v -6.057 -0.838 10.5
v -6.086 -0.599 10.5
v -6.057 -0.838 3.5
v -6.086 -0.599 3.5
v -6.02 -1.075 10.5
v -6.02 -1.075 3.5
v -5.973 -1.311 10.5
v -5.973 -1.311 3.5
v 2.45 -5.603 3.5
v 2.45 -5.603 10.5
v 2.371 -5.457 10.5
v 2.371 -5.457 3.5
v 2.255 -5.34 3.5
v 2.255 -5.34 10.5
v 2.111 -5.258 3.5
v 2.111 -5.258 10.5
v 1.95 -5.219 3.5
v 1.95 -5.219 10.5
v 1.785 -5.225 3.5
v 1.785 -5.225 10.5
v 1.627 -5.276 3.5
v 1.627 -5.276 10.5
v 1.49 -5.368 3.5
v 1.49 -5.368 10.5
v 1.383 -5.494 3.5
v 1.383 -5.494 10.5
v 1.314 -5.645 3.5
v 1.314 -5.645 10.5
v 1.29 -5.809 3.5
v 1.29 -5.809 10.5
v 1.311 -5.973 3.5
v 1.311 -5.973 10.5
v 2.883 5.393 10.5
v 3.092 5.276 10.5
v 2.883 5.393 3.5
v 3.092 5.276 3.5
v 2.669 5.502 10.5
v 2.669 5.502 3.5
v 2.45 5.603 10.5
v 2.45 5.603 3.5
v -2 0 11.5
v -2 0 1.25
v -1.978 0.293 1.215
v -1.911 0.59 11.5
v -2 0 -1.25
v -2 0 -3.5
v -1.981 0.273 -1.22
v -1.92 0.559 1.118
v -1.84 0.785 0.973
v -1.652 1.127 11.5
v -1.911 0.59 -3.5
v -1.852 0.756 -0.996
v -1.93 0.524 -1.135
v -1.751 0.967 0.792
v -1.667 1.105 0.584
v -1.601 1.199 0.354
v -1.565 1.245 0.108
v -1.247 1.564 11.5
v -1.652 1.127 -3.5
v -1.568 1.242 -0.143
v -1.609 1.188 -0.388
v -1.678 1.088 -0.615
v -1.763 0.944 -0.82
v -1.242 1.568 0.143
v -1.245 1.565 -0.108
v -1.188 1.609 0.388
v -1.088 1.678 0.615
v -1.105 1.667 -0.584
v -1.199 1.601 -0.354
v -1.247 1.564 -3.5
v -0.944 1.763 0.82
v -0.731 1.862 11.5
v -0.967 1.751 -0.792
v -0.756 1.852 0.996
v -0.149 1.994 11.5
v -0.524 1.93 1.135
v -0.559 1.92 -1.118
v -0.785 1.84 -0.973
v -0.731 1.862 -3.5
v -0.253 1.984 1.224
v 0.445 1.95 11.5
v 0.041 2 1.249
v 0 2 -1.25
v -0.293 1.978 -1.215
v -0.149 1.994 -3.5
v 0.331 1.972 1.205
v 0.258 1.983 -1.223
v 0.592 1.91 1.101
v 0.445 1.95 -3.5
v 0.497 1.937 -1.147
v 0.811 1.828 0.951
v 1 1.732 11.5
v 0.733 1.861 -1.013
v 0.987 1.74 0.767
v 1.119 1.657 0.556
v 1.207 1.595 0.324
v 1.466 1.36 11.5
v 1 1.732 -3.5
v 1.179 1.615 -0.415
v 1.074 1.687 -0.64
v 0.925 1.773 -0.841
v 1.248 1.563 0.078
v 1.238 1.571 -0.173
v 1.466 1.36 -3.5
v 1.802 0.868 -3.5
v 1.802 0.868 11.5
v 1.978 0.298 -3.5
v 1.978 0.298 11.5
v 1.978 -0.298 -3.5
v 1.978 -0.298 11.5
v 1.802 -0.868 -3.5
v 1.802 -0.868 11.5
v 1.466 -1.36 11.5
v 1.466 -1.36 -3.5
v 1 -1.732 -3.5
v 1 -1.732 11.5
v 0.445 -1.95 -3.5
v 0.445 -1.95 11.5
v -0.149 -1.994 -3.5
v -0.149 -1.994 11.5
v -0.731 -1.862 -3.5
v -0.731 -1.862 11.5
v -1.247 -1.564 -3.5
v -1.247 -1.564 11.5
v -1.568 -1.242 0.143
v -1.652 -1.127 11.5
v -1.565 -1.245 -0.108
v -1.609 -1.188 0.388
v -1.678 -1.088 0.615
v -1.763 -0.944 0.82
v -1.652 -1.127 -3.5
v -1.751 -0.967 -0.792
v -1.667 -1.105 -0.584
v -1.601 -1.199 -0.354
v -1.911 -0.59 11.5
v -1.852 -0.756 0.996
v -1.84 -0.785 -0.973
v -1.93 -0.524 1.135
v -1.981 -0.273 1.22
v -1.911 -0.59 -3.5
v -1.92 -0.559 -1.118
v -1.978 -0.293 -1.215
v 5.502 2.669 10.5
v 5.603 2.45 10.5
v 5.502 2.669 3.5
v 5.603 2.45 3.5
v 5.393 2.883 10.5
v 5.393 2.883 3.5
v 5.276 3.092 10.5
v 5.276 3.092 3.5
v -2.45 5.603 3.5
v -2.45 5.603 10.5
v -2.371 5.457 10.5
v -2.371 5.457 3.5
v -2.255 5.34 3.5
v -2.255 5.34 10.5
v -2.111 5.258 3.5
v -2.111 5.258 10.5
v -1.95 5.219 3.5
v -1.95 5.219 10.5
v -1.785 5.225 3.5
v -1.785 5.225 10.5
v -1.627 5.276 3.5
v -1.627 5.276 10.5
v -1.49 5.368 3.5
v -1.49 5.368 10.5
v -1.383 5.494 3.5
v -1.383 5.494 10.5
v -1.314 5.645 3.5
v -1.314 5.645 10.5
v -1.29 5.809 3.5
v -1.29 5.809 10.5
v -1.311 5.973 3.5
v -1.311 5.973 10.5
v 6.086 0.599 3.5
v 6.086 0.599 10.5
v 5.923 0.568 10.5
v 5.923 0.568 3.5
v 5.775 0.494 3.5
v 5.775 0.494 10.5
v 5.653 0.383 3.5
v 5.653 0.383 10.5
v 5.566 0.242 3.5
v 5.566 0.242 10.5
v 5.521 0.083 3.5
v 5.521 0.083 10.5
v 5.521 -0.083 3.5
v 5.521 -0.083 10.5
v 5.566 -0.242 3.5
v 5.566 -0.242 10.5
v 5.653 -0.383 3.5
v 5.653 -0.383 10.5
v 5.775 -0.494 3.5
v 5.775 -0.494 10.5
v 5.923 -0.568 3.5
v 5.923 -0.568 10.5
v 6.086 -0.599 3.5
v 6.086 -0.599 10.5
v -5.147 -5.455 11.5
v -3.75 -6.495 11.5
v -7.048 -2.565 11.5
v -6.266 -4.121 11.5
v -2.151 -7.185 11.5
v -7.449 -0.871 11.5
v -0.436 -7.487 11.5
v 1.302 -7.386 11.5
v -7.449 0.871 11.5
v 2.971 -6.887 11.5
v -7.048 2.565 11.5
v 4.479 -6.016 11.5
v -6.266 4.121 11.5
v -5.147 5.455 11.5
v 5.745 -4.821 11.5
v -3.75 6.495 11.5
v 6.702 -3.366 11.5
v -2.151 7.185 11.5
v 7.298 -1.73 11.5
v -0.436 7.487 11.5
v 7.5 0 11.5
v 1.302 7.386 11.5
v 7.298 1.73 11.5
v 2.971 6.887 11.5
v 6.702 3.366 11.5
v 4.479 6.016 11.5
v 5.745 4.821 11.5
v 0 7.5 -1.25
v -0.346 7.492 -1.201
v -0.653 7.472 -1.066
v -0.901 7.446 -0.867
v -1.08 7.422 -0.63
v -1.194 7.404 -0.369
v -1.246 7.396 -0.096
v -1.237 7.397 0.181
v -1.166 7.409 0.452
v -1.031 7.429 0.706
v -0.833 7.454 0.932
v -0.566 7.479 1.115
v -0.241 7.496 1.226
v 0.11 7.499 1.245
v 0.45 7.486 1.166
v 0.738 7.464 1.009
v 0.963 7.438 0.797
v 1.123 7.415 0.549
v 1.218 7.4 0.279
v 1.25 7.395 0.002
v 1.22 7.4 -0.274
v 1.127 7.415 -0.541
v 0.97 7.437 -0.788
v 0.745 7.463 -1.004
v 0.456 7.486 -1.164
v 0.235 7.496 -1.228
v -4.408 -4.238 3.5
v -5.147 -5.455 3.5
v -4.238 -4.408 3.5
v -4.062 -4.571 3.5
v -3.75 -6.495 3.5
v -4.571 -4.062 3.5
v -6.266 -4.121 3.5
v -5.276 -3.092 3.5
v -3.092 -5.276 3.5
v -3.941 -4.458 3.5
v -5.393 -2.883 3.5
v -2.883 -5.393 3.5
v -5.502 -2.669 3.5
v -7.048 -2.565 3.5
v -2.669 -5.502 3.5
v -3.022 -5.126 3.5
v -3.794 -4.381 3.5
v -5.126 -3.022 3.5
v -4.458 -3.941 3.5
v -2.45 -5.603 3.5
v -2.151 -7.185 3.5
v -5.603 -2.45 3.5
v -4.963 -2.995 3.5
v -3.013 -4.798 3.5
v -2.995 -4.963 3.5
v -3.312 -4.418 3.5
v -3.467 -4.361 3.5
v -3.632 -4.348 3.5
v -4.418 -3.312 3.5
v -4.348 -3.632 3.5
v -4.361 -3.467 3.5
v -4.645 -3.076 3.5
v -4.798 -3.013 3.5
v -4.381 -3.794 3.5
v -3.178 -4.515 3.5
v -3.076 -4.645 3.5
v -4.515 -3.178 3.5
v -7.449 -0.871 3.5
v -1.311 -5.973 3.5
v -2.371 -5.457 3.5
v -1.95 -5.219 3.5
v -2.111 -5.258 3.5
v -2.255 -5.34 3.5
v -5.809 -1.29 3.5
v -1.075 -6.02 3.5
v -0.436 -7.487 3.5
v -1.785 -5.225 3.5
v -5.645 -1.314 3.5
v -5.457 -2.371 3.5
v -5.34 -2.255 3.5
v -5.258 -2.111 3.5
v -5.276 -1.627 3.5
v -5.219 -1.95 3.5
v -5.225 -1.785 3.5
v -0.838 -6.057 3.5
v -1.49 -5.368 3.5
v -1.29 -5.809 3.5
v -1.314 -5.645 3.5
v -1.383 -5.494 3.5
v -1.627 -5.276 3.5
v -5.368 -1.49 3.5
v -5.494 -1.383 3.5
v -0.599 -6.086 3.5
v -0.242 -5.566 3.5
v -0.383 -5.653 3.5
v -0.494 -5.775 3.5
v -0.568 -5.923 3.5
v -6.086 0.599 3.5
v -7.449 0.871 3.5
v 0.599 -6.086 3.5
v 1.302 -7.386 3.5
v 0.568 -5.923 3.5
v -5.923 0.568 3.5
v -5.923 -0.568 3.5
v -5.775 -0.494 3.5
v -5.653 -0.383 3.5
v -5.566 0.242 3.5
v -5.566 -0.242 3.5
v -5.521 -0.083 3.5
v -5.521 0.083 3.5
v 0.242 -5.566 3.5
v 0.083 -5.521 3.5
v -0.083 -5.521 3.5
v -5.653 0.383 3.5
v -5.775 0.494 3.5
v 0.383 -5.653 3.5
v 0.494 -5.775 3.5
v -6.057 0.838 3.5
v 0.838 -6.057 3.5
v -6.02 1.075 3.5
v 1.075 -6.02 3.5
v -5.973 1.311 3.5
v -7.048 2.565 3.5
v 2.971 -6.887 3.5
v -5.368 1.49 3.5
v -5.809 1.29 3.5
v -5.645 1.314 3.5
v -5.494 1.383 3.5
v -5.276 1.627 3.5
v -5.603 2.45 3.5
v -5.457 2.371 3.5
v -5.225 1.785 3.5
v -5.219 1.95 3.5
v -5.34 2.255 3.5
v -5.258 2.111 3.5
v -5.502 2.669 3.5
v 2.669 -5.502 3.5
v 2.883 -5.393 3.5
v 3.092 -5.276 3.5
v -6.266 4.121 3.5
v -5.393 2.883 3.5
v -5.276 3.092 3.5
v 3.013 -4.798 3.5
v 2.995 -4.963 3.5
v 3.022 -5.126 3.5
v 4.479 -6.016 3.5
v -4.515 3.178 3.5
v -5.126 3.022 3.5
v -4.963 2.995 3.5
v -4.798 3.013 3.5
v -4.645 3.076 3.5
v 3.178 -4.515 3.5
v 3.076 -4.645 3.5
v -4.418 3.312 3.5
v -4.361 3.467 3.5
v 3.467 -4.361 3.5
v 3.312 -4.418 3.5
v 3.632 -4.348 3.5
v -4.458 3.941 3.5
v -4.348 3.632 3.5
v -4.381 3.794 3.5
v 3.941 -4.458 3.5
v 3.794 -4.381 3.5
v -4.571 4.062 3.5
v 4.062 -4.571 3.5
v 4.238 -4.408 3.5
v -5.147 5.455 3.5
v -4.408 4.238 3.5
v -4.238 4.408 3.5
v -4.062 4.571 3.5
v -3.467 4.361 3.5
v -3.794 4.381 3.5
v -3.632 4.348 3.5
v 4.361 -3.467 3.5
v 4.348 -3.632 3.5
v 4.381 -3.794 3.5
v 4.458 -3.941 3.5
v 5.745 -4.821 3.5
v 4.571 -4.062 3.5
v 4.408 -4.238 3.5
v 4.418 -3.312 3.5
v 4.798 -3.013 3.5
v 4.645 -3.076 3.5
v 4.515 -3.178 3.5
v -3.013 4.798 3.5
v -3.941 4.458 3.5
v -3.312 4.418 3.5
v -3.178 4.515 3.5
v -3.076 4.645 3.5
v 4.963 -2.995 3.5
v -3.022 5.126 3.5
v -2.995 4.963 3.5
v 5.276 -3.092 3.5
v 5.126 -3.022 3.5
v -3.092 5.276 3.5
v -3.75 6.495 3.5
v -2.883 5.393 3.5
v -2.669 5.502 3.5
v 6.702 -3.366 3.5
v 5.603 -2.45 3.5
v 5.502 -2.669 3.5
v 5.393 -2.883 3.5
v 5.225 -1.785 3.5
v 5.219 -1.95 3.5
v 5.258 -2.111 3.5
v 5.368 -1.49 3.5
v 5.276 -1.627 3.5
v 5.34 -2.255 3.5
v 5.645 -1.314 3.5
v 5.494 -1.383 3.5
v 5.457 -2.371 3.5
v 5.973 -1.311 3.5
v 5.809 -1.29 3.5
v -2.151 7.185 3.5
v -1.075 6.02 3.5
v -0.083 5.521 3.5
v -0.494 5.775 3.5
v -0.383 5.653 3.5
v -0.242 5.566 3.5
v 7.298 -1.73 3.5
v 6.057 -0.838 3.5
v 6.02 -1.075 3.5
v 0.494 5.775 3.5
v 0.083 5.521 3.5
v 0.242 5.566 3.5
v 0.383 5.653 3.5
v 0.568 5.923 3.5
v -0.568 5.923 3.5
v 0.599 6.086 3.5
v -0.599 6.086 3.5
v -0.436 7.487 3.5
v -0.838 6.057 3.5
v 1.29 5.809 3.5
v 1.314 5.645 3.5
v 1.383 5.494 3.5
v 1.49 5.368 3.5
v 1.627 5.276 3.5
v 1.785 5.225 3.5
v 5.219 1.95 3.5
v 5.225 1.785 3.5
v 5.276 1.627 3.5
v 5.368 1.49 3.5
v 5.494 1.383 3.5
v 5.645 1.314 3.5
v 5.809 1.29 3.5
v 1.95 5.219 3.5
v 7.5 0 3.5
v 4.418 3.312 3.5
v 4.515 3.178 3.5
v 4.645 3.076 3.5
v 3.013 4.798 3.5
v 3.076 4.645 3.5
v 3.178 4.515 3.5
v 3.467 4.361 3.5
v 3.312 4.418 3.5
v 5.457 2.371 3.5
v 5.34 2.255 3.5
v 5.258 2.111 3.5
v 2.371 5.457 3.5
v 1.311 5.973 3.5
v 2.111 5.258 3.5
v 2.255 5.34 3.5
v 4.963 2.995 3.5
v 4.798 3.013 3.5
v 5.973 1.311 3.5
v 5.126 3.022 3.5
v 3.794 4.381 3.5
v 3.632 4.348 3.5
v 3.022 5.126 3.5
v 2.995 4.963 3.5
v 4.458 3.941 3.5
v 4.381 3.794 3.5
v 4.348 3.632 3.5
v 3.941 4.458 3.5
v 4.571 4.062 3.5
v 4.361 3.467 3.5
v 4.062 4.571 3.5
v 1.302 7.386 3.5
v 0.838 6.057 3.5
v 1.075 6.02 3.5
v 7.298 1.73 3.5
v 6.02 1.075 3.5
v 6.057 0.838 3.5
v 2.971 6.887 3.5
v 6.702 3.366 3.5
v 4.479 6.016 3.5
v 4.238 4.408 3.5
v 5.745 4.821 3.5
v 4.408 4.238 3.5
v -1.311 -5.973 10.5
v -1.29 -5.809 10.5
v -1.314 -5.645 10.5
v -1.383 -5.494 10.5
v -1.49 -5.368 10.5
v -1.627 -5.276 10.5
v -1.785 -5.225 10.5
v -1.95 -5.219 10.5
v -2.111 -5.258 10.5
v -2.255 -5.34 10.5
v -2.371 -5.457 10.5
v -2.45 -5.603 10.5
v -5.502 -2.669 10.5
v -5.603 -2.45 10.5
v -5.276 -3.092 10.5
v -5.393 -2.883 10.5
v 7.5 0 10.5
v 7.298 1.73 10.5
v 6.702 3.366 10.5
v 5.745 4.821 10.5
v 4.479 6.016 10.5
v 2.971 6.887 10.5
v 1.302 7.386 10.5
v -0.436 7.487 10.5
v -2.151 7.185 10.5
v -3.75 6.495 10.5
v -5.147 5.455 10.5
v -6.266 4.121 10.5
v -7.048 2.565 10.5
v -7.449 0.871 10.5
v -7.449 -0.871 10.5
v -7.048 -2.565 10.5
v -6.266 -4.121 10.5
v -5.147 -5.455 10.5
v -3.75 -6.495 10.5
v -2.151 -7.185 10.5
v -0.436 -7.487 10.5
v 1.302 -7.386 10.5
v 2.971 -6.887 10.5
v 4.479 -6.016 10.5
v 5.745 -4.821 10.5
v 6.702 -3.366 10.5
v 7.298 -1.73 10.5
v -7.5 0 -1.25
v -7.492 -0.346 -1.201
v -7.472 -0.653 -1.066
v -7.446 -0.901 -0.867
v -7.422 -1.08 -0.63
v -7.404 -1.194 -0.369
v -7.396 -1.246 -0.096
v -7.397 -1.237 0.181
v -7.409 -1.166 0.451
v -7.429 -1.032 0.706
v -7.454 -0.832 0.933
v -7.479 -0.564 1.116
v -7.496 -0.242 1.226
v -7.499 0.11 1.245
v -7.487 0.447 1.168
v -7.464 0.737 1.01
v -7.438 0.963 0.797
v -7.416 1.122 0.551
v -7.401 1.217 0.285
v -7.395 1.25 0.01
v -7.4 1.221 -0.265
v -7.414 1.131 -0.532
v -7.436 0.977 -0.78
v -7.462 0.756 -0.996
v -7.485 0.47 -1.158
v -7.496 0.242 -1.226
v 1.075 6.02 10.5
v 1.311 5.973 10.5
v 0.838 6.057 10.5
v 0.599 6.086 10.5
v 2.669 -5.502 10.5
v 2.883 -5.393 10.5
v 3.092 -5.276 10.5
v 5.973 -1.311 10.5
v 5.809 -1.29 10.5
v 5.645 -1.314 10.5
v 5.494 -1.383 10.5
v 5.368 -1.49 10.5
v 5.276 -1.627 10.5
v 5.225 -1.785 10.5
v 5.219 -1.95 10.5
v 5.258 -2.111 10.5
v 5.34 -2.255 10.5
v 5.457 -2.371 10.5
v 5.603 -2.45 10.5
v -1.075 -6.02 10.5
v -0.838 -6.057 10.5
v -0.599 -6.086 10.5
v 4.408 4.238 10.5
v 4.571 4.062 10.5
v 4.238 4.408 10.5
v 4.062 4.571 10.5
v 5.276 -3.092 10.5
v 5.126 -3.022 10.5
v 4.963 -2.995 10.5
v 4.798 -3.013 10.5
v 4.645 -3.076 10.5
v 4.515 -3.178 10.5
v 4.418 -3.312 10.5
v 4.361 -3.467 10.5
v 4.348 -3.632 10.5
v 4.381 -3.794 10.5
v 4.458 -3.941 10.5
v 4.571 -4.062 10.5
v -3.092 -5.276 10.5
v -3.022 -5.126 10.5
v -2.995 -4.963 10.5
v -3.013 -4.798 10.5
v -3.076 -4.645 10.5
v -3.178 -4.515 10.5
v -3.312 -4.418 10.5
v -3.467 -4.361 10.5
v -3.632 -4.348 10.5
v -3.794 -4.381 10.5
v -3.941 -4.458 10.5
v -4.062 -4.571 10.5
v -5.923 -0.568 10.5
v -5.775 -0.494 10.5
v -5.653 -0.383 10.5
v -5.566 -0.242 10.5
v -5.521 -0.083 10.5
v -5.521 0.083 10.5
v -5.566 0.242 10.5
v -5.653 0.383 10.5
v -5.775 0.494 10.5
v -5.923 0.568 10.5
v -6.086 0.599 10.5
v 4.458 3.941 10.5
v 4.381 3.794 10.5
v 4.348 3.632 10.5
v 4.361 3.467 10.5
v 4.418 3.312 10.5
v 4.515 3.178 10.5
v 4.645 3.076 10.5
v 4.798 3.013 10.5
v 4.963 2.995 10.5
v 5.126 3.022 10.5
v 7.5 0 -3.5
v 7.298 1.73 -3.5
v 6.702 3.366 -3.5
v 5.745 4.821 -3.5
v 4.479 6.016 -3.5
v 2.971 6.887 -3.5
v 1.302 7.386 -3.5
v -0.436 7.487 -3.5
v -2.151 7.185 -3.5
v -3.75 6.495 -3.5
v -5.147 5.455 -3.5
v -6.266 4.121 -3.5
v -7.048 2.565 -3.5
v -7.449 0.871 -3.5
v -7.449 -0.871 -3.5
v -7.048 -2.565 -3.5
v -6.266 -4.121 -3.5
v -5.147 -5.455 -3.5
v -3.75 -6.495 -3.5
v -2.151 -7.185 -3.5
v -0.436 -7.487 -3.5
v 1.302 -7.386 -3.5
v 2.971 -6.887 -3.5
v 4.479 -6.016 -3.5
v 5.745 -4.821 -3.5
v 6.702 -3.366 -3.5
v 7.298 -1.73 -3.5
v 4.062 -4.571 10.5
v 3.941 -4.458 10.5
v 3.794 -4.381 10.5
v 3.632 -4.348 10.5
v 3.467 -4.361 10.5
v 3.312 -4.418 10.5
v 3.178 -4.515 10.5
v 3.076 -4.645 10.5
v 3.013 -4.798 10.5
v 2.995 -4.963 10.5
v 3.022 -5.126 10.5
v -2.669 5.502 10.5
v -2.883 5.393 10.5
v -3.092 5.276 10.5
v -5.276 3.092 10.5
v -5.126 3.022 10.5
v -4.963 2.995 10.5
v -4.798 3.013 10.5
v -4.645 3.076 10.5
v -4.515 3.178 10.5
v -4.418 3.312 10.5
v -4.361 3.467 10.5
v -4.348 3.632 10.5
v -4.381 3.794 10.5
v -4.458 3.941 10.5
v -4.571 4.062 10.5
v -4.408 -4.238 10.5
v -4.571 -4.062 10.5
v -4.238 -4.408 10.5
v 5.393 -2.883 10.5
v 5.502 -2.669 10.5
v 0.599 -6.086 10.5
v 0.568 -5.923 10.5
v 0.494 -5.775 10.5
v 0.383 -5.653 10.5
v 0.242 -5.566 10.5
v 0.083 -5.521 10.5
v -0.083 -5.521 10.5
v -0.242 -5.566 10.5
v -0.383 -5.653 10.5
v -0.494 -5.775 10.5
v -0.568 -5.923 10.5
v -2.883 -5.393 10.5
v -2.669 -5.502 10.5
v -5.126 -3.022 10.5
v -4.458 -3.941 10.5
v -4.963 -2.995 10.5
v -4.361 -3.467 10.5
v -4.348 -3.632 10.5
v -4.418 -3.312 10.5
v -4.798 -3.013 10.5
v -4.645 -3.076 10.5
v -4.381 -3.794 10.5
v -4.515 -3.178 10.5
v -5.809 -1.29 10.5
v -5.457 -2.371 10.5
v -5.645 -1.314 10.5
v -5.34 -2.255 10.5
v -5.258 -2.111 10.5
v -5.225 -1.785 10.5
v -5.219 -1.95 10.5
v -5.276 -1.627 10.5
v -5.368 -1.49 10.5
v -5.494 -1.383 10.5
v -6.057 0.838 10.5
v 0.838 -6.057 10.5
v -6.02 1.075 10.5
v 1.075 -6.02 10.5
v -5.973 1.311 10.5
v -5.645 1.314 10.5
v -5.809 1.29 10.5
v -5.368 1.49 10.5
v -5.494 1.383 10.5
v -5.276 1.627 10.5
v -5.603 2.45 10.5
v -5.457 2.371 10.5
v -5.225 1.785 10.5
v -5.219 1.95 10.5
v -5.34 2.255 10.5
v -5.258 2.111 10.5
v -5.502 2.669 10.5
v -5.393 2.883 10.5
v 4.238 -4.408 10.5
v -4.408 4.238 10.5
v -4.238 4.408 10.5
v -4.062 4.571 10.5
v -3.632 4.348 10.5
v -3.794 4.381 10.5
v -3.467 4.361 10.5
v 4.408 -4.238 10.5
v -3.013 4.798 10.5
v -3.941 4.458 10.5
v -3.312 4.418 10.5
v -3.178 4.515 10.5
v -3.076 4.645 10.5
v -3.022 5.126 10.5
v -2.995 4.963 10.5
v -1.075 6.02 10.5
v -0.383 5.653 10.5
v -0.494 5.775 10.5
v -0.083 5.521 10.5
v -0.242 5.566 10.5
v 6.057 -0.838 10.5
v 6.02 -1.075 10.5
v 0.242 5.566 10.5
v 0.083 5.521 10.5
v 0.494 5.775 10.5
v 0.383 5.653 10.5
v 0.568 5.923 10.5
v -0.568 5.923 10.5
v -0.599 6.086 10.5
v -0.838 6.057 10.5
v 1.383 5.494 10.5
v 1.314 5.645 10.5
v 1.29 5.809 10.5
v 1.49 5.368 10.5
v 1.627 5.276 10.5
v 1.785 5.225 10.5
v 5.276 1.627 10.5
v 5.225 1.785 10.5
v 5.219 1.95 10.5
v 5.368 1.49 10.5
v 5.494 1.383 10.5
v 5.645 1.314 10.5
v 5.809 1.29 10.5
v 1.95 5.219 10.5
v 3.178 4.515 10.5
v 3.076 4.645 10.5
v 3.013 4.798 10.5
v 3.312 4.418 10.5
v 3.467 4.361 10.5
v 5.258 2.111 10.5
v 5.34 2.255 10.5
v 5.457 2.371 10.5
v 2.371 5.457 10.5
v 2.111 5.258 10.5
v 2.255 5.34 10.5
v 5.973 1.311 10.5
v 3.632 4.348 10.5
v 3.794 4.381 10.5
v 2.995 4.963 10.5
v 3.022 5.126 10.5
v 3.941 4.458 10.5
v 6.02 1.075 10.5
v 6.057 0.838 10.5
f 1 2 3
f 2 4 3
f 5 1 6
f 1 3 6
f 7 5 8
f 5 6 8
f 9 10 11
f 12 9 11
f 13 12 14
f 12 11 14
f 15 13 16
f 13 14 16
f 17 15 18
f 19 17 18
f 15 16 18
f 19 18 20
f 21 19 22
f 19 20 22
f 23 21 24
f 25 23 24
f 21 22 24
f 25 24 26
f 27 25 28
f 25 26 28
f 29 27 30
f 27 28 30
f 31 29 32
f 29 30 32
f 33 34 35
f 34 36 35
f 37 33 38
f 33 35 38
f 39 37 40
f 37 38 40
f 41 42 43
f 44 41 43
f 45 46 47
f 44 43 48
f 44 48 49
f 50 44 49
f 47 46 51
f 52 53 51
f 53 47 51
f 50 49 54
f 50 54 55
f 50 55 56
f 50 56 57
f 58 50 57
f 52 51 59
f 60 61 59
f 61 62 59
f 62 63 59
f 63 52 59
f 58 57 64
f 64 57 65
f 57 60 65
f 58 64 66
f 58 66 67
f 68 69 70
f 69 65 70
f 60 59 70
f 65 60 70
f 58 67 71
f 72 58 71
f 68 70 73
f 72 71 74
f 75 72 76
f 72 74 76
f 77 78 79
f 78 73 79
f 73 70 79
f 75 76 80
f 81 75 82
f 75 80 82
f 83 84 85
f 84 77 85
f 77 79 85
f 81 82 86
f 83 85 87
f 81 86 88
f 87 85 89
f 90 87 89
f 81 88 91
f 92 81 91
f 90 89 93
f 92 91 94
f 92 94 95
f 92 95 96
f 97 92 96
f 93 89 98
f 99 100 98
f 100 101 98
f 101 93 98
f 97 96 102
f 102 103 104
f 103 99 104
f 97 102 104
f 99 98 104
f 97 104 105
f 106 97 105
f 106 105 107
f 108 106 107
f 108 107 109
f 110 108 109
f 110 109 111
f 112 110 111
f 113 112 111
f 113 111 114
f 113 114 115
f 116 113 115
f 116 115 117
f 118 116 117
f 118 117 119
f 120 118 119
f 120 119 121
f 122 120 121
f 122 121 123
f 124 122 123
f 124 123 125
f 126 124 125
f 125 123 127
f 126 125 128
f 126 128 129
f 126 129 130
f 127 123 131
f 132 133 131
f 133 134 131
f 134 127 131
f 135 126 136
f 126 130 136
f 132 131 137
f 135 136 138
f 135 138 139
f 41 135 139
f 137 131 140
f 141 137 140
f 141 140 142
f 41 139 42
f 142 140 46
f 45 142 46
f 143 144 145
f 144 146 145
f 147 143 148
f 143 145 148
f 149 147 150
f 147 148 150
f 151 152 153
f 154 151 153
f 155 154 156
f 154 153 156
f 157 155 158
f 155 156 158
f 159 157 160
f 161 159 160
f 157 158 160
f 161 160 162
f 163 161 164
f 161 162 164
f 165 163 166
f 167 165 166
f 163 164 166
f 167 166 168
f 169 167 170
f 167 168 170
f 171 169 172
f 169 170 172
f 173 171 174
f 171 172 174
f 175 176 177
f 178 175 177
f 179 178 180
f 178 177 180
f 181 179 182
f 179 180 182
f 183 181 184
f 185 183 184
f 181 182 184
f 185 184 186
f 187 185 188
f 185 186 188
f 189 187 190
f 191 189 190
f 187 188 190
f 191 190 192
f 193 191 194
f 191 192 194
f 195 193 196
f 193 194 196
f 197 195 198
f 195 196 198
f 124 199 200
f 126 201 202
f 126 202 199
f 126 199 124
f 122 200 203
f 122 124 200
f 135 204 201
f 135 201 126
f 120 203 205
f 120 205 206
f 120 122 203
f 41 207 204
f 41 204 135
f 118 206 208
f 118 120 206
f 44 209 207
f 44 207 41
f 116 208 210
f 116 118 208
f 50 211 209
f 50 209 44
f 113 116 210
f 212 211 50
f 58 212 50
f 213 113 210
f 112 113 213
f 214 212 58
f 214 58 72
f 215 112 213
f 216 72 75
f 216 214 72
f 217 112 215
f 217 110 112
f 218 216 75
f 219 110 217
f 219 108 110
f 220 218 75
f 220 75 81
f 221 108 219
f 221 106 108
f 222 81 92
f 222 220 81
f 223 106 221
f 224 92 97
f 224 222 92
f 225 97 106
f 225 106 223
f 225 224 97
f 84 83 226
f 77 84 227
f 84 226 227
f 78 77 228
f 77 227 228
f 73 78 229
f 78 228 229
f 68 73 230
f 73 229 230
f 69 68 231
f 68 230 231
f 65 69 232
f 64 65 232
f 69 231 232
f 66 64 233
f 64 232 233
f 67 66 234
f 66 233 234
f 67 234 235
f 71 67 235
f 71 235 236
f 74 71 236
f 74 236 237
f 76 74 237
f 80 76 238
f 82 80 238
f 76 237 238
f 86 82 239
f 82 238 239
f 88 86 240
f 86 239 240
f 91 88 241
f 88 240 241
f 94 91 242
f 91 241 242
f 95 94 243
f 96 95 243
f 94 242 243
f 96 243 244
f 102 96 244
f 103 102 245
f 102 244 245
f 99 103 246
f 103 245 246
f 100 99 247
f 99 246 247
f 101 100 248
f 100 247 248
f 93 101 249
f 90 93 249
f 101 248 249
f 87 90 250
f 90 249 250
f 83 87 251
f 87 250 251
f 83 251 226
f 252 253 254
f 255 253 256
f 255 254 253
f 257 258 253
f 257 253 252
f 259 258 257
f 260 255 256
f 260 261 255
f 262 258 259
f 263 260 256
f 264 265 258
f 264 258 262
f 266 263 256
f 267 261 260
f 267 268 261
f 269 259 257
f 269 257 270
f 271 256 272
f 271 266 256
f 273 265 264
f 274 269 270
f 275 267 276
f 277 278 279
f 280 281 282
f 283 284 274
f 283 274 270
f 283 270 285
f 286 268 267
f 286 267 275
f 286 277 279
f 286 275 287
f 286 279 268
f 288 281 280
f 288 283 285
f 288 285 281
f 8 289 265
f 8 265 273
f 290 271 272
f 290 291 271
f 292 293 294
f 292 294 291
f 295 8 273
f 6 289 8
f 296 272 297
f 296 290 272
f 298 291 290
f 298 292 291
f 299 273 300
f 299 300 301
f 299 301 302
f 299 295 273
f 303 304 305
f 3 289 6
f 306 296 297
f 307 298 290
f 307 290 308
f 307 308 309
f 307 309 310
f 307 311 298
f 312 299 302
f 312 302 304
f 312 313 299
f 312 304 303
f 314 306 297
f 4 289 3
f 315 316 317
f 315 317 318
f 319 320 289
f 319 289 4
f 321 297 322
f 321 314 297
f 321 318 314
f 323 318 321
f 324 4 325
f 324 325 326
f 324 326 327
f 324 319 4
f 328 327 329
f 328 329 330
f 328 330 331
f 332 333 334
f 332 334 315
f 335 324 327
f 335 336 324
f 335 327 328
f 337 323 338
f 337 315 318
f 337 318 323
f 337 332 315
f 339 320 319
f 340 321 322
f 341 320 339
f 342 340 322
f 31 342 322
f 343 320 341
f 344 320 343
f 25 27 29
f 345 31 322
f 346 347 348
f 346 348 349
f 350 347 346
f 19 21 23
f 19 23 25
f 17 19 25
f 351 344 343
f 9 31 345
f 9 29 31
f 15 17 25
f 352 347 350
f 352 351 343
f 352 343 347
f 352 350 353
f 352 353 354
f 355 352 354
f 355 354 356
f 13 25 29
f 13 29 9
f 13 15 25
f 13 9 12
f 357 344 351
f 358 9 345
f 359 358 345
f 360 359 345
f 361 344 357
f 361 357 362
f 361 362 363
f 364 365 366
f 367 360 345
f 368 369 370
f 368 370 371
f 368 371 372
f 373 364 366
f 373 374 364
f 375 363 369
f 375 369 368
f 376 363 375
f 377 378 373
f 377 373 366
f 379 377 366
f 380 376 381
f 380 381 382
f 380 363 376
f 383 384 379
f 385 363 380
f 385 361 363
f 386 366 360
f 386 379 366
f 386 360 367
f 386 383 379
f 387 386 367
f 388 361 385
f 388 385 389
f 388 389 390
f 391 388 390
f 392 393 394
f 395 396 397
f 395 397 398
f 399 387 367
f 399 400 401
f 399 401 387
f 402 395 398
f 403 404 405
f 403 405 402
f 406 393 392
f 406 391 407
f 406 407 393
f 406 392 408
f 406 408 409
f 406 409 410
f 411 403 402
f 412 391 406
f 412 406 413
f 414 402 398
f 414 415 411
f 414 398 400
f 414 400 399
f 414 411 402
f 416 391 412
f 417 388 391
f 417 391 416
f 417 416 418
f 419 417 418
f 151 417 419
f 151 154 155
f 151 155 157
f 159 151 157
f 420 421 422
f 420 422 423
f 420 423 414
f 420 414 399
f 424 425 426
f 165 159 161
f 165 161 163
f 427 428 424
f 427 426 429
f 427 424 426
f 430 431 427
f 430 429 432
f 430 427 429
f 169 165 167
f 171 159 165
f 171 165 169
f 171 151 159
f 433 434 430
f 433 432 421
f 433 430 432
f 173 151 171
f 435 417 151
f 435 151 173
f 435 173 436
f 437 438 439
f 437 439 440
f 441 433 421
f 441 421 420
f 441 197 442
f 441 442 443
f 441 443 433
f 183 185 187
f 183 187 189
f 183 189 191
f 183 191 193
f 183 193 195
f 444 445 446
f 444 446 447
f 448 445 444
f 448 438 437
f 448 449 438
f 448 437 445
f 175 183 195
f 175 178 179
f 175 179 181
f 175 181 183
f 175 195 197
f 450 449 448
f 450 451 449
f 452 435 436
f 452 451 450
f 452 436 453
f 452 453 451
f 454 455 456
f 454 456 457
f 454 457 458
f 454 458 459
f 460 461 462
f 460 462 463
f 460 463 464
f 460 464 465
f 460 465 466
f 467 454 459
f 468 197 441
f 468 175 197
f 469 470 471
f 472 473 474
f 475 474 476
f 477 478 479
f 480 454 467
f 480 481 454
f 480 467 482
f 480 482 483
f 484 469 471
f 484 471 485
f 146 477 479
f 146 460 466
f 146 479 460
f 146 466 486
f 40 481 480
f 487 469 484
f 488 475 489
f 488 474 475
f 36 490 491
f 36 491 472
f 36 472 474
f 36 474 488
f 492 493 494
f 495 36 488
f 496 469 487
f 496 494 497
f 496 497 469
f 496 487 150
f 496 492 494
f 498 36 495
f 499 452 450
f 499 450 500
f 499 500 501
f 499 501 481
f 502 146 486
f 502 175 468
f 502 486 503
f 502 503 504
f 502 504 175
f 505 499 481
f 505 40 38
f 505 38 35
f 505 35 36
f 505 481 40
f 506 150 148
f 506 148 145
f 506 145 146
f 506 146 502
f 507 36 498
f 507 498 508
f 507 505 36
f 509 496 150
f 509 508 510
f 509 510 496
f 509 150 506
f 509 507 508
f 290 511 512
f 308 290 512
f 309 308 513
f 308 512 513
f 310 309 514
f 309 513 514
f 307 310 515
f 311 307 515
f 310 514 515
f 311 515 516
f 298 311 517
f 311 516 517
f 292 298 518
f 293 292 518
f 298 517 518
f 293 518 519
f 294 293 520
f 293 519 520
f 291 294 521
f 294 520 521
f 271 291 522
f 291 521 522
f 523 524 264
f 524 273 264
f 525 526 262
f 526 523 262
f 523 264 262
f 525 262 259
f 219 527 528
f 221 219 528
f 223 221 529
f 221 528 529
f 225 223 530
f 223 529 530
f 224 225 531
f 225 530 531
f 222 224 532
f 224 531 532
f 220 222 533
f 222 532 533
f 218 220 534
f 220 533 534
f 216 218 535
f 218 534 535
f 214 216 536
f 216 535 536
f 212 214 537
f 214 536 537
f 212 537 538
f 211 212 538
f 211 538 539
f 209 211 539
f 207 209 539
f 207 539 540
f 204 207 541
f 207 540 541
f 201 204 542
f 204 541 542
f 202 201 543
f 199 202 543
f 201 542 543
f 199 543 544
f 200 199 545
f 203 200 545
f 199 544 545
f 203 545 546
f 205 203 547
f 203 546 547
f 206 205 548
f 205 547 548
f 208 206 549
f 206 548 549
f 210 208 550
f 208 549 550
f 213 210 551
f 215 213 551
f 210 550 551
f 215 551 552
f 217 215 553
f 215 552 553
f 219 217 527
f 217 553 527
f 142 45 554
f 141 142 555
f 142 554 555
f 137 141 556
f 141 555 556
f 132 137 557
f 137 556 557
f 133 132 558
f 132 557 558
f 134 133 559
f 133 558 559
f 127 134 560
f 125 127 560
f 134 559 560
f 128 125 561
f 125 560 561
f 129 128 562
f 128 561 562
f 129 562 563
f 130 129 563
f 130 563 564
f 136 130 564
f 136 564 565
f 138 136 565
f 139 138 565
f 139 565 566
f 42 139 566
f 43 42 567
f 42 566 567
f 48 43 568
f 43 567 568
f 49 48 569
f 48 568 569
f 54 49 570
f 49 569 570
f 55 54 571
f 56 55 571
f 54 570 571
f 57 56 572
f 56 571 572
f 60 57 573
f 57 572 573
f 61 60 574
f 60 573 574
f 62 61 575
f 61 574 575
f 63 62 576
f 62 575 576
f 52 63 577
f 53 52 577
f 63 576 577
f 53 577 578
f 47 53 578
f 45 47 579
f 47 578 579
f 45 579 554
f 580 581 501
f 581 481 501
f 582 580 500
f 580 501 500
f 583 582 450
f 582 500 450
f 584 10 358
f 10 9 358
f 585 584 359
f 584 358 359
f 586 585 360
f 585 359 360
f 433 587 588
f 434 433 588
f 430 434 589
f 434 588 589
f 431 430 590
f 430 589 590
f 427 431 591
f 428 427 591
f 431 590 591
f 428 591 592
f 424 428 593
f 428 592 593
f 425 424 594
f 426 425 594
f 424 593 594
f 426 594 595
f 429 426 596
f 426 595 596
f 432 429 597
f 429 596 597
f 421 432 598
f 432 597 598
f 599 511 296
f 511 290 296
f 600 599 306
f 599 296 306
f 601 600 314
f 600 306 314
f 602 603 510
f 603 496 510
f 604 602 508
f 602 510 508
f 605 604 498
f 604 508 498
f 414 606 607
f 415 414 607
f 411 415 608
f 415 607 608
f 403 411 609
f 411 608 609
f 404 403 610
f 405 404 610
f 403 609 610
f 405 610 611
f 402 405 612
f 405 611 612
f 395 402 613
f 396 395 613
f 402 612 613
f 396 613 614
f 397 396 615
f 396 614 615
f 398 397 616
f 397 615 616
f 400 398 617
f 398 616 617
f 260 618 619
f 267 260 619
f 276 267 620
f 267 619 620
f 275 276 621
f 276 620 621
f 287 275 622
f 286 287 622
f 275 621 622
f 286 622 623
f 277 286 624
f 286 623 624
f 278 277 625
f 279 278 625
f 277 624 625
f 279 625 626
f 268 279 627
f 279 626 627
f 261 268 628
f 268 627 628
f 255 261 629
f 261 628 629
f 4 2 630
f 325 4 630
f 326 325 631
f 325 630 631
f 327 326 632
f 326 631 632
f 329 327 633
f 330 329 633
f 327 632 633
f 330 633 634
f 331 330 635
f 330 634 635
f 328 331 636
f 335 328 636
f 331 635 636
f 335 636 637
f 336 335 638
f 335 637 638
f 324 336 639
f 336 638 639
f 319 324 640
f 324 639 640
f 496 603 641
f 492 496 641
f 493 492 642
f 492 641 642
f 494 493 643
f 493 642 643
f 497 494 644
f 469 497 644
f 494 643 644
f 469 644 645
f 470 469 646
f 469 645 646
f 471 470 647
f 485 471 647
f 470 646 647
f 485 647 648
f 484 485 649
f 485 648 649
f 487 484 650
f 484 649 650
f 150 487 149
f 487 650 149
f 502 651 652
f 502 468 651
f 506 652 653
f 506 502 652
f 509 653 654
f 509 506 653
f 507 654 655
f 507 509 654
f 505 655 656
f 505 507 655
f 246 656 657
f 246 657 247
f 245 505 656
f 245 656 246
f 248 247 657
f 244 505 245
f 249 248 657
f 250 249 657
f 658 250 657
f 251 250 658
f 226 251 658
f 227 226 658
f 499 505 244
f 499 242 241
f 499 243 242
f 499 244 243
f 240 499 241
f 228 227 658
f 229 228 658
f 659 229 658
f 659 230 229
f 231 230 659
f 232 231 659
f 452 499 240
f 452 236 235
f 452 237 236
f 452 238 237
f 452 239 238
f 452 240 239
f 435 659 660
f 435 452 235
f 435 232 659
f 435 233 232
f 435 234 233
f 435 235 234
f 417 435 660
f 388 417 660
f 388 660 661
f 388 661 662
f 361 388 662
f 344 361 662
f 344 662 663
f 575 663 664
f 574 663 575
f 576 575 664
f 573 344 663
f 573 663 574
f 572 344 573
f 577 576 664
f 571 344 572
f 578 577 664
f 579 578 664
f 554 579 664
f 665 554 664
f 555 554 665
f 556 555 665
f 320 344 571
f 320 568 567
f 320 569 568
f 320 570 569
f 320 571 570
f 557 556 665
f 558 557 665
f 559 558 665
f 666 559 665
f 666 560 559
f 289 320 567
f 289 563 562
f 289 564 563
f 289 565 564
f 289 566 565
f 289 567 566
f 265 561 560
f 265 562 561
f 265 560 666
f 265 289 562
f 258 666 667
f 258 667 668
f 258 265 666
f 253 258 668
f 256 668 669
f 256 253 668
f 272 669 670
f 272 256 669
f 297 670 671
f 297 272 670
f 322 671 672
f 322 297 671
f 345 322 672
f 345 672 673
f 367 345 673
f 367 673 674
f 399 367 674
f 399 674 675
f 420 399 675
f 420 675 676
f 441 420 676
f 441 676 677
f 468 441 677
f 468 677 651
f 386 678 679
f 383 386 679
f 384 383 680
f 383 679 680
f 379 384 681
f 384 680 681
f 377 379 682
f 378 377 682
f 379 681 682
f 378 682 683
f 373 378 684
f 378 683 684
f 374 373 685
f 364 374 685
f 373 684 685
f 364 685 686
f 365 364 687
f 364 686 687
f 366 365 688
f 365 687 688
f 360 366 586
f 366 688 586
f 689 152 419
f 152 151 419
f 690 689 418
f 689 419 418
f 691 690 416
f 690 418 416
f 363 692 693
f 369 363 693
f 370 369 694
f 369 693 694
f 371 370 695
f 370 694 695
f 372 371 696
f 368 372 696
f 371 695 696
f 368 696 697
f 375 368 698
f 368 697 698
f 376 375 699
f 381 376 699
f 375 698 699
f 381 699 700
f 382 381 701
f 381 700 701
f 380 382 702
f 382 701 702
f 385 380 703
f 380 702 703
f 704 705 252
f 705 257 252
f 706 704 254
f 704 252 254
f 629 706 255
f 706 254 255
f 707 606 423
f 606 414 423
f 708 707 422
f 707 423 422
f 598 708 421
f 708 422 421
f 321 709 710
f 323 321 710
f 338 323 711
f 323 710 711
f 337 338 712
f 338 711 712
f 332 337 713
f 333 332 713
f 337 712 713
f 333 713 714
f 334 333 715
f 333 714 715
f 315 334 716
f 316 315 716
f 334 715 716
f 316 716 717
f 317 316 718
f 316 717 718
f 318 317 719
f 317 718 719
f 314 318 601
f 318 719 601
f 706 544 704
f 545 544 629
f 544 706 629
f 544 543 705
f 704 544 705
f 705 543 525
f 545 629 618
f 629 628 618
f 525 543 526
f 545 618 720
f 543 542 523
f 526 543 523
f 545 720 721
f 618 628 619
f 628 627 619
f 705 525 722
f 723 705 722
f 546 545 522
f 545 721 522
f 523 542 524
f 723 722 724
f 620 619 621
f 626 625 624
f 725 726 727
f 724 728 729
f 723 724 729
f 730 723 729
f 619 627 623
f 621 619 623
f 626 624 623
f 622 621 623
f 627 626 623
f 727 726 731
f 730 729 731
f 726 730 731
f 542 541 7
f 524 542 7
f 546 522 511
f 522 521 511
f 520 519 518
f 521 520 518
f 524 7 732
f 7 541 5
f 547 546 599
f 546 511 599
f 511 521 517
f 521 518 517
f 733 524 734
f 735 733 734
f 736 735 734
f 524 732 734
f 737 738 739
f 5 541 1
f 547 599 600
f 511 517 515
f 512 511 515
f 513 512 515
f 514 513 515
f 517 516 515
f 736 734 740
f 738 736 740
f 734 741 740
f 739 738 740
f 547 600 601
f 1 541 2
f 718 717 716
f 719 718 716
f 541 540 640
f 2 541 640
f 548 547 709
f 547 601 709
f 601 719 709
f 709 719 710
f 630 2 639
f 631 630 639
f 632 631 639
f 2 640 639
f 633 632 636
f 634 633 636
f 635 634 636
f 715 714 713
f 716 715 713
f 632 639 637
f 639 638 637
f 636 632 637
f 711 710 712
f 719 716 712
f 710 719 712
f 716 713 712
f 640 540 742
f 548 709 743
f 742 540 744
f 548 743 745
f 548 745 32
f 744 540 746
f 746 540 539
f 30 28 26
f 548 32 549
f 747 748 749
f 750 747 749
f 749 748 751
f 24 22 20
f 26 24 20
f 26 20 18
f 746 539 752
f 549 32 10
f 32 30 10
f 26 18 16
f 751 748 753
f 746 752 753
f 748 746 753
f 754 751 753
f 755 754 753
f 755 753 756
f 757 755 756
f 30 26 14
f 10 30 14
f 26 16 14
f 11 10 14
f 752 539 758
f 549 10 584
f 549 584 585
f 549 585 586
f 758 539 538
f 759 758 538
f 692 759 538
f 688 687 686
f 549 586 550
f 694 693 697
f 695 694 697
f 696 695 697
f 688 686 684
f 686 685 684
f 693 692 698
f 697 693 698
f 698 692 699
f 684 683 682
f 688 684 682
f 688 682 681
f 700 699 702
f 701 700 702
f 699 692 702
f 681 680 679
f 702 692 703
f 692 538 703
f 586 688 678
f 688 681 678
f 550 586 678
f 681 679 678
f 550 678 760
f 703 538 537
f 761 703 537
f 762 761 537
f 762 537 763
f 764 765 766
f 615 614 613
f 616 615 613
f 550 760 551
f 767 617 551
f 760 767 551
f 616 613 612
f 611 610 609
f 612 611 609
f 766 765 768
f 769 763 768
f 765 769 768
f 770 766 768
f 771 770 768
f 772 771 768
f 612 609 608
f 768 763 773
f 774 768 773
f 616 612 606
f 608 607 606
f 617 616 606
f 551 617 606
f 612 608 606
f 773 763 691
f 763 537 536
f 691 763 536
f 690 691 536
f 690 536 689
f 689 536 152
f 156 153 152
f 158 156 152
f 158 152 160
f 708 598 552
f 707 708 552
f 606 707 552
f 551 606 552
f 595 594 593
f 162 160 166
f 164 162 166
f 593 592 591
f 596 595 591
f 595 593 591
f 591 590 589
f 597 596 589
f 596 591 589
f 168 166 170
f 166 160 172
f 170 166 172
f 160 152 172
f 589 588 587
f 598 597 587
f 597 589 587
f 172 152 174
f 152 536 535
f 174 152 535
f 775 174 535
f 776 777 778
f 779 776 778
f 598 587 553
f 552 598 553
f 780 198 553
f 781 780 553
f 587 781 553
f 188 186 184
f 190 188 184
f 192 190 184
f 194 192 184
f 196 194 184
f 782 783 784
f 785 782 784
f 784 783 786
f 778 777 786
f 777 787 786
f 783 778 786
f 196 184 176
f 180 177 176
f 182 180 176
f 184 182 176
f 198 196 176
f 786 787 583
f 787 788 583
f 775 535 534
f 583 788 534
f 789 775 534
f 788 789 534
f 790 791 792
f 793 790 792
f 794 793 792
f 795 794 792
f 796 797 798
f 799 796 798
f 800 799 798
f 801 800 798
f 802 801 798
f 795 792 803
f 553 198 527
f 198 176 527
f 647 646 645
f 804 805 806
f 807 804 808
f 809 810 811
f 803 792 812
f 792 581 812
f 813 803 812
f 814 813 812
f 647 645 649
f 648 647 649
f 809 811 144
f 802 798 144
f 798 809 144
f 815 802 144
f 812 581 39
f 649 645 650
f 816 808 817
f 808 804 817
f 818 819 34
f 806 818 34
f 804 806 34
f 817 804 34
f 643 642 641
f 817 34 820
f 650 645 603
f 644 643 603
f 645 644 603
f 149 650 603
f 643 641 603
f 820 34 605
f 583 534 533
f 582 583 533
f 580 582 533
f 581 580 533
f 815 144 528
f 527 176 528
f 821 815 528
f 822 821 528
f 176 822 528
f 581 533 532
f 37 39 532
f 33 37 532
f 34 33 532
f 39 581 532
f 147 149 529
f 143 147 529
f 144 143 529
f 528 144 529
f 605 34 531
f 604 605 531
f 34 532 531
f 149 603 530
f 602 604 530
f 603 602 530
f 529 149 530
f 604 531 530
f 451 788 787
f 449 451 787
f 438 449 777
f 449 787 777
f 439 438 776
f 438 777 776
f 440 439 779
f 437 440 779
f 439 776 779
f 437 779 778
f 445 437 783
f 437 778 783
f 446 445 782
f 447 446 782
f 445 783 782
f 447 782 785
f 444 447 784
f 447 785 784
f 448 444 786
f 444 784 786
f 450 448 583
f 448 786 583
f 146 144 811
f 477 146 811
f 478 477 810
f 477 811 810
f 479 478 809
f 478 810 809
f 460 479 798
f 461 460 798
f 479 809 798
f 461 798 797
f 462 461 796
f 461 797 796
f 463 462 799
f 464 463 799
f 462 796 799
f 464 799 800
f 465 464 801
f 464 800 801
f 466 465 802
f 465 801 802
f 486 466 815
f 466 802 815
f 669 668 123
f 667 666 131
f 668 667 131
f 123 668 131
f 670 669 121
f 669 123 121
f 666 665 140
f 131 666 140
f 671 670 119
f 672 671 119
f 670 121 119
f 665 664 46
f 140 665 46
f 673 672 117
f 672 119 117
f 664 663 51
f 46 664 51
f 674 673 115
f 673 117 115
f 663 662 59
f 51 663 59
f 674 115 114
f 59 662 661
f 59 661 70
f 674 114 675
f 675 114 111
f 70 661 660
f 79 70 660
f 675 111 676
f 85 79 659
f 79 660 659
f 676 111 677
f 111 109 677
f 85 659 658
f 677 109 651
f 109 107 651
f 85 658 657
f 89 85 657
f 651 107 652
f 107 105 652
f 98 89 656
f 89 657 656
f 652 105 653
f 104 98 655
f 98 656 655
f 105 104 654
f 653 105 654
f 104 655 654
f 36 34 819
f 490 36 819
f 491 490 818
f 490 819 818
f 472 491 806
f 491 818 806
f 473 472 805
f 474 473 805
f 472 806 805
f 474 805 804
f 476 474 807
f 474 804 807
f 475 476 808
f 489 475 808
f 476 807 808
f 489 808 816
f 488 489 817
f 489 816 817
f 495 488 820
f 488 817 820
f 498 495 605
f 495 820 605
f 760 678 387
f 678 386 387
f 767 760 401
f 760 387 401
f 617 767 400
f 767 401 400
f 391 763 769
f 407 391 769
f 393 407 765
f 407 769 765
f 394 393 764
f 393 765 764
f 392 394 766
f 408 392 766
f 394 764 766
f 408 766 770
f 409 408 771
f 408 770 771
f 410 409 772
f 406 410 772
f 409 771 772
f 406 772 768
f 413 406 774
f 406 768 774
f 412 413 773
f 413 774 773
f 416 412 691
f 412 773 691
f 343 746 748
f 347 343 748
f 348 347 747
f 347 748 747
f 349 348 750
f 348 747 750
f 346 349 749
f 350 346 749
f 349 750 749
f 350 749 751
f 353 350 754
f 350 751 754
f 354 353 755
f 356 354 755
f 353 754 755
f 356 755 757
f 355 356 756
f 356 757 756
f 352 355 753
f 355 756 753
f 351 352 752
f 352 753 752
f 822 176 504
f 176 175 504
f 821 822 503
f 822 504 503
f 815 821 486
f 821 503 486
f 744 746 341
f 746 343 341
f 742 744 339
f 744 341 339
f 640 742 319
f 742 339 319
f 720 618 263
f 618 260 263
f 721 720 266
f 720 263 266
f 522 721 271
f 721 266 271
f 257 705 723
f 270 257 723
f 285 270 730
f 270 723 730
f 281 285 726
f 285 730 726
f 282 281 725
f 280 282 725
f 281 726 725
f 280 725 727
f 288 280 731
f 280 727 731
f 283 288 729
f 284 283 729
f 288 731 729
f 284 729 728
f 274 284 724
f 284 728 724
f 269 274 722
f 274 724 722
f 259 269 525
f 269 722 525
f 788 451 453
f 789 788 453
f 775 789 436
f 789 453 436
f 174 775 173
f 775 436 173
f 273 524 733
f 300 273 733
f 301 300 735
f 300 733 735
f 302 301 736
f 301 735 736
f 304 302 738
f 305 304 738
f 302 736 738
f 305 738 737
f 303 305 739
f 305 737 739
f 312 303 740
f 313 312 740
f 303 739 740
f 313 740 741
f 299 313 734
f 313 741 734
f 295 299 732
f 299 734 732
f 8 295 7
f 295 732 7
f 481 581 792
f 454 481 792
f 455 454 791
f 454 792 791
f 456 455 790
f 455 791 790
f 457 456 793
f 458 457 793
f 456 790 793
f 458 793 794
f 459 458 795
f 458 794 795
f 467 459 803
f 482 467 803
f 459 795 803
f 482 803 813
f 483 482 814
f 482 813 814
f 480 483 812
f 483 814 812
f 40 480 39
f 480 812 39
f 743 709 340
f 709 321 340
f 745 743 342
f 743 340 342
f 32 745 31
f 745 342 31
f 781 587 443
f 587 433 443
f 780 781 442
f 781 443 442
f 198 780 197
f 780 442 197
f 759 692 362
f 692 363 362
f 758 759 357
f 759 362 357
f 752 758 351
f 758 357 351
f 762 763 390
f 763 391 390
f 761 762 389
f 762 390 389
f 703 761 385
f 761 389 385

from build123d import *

# Parameters (mm, degrees)
SKETCH_1_R               = 7.5
EXTRUDE_1_DEPTH          = 3.5
SKETCH_2_R               = 6.115
EXTRUDE_2_DEPTH          = 7
CUT_EXTRUDE_3_DEPTH      = 7
SKETCH_3_R               = 7.5
EXTRUDE_3_DEPTH          = 1
SKETCH_6_R               = 2
CUT_EXTRUDE_2_DEPTH      = 16
PATTERN_CIRCULAR_2_COUNT = 20
SKETCH_13_W              = 1.25
SKETCH_13_H              = 7.5
PATTERN_CIRCULAR_4_COUNT = 2
PATTERN_CIRCULAR_4_ANGLE = 90


with BuildPart() as part:
    # 草圖1 → 填料-伸長1 (new body, symmetric)
    with BuildSketch(Plane.XY):
        Circle(SKETCH_1_R)
    extrude(amount=EXTRUDE_1_DEPTH, both=True)

    # 草圖2 → 填料-伸長2 (add)
    with BuildSketch(Plane.XY.offset(3.5)):
        Circle(SKETCH_2_R)
    extrude(amount=EXTRUDE_2_DEPTH)

    # 草圖7 → 除料-伸長3 (cut)
    with BuildSketch(Plane.XY.offset(10.5)):
        with BuildLine():
            ThreePointArc((-0.599277509, 6.085564186), (0, 5.515), (0.599277509, 6.085564186))
            ThreePointArc((0.599277509, 6.085564186), (0, 6.115), (-0.599277509, 6.085564186))
        make_face()
    cut_extrude_3 = extrude(amount=-CUT_EXTRUDE_3_DEPTH, mode=Mode.SUBTRACT)

    # 草圖3 → 填料-伸長3 (add)
    with BuildSketch(Plane.XY.offset(10.5)):
        Circle(SKETCH_3_R)
    extrude(amount=EXTRUDE_3_DEPTH)

    # 草圖6 → 除料-伸長2 (cut, through all)
    with BuildSketch(Plane(origin=(0, 0, -3.5), x_dir=(-1, 0, 0), z_dir=(0, 0, -1))):
        Circle(SKETCH_6_R)
    extrude(amount=-CUT_EXTRUDE_2_DEPTH, mode=Mode.SUBTRACT)

    # 環狀複製排列2: 除料-伸長3 ×20 about axis
    pattern_circular_2_axis = Axis((0, 0, 0), (0, 0, 1))
    for i in range(1, PATTERN_CIRCULAR_2_COUNT):
        add(cut_extrude_3.rotate(pattern_circular_2_axis, i * 360 / PATTERN_CIRCULAR_2_COUNT), mode=Mode.SUBTRACT)

    # 草圖13 → M3x0.5 螺紋孔3 (revolve, cut)
    with BuildSketch(Plane(origin=(0, 0, 0), x_dir=(0, 0, -1), z_dir=(1, 0, 0))):
        with Locations((0.625, 3.75)):
            Rectangle(SKETCH_13_W, SKETCH_13_H)
    m3x0_5_3 = revolve(axis=Axis((0, -6.35, 0), (0, 1, 0)), mode=Mode.SUBTRACT)

    # 環狀複製排列4: M3x0.5 螺紋孔3 ×2 about axis
    pattern_circular_4_axis = Axis((0, 0, 3.5), (0, 0, 1))
    for i in range(1, PATTERN_CIRCULAR_4_COUNT):
        add(m3x0_5_3.rotate(pattern_circular_4_axis, i * PATTERN_CIRCULAR_4_ANGLE / (PATTERN_CIRCULAR_4_COUNT - 1)), mode=Mode.SUBTRACT)


solid = part.part
